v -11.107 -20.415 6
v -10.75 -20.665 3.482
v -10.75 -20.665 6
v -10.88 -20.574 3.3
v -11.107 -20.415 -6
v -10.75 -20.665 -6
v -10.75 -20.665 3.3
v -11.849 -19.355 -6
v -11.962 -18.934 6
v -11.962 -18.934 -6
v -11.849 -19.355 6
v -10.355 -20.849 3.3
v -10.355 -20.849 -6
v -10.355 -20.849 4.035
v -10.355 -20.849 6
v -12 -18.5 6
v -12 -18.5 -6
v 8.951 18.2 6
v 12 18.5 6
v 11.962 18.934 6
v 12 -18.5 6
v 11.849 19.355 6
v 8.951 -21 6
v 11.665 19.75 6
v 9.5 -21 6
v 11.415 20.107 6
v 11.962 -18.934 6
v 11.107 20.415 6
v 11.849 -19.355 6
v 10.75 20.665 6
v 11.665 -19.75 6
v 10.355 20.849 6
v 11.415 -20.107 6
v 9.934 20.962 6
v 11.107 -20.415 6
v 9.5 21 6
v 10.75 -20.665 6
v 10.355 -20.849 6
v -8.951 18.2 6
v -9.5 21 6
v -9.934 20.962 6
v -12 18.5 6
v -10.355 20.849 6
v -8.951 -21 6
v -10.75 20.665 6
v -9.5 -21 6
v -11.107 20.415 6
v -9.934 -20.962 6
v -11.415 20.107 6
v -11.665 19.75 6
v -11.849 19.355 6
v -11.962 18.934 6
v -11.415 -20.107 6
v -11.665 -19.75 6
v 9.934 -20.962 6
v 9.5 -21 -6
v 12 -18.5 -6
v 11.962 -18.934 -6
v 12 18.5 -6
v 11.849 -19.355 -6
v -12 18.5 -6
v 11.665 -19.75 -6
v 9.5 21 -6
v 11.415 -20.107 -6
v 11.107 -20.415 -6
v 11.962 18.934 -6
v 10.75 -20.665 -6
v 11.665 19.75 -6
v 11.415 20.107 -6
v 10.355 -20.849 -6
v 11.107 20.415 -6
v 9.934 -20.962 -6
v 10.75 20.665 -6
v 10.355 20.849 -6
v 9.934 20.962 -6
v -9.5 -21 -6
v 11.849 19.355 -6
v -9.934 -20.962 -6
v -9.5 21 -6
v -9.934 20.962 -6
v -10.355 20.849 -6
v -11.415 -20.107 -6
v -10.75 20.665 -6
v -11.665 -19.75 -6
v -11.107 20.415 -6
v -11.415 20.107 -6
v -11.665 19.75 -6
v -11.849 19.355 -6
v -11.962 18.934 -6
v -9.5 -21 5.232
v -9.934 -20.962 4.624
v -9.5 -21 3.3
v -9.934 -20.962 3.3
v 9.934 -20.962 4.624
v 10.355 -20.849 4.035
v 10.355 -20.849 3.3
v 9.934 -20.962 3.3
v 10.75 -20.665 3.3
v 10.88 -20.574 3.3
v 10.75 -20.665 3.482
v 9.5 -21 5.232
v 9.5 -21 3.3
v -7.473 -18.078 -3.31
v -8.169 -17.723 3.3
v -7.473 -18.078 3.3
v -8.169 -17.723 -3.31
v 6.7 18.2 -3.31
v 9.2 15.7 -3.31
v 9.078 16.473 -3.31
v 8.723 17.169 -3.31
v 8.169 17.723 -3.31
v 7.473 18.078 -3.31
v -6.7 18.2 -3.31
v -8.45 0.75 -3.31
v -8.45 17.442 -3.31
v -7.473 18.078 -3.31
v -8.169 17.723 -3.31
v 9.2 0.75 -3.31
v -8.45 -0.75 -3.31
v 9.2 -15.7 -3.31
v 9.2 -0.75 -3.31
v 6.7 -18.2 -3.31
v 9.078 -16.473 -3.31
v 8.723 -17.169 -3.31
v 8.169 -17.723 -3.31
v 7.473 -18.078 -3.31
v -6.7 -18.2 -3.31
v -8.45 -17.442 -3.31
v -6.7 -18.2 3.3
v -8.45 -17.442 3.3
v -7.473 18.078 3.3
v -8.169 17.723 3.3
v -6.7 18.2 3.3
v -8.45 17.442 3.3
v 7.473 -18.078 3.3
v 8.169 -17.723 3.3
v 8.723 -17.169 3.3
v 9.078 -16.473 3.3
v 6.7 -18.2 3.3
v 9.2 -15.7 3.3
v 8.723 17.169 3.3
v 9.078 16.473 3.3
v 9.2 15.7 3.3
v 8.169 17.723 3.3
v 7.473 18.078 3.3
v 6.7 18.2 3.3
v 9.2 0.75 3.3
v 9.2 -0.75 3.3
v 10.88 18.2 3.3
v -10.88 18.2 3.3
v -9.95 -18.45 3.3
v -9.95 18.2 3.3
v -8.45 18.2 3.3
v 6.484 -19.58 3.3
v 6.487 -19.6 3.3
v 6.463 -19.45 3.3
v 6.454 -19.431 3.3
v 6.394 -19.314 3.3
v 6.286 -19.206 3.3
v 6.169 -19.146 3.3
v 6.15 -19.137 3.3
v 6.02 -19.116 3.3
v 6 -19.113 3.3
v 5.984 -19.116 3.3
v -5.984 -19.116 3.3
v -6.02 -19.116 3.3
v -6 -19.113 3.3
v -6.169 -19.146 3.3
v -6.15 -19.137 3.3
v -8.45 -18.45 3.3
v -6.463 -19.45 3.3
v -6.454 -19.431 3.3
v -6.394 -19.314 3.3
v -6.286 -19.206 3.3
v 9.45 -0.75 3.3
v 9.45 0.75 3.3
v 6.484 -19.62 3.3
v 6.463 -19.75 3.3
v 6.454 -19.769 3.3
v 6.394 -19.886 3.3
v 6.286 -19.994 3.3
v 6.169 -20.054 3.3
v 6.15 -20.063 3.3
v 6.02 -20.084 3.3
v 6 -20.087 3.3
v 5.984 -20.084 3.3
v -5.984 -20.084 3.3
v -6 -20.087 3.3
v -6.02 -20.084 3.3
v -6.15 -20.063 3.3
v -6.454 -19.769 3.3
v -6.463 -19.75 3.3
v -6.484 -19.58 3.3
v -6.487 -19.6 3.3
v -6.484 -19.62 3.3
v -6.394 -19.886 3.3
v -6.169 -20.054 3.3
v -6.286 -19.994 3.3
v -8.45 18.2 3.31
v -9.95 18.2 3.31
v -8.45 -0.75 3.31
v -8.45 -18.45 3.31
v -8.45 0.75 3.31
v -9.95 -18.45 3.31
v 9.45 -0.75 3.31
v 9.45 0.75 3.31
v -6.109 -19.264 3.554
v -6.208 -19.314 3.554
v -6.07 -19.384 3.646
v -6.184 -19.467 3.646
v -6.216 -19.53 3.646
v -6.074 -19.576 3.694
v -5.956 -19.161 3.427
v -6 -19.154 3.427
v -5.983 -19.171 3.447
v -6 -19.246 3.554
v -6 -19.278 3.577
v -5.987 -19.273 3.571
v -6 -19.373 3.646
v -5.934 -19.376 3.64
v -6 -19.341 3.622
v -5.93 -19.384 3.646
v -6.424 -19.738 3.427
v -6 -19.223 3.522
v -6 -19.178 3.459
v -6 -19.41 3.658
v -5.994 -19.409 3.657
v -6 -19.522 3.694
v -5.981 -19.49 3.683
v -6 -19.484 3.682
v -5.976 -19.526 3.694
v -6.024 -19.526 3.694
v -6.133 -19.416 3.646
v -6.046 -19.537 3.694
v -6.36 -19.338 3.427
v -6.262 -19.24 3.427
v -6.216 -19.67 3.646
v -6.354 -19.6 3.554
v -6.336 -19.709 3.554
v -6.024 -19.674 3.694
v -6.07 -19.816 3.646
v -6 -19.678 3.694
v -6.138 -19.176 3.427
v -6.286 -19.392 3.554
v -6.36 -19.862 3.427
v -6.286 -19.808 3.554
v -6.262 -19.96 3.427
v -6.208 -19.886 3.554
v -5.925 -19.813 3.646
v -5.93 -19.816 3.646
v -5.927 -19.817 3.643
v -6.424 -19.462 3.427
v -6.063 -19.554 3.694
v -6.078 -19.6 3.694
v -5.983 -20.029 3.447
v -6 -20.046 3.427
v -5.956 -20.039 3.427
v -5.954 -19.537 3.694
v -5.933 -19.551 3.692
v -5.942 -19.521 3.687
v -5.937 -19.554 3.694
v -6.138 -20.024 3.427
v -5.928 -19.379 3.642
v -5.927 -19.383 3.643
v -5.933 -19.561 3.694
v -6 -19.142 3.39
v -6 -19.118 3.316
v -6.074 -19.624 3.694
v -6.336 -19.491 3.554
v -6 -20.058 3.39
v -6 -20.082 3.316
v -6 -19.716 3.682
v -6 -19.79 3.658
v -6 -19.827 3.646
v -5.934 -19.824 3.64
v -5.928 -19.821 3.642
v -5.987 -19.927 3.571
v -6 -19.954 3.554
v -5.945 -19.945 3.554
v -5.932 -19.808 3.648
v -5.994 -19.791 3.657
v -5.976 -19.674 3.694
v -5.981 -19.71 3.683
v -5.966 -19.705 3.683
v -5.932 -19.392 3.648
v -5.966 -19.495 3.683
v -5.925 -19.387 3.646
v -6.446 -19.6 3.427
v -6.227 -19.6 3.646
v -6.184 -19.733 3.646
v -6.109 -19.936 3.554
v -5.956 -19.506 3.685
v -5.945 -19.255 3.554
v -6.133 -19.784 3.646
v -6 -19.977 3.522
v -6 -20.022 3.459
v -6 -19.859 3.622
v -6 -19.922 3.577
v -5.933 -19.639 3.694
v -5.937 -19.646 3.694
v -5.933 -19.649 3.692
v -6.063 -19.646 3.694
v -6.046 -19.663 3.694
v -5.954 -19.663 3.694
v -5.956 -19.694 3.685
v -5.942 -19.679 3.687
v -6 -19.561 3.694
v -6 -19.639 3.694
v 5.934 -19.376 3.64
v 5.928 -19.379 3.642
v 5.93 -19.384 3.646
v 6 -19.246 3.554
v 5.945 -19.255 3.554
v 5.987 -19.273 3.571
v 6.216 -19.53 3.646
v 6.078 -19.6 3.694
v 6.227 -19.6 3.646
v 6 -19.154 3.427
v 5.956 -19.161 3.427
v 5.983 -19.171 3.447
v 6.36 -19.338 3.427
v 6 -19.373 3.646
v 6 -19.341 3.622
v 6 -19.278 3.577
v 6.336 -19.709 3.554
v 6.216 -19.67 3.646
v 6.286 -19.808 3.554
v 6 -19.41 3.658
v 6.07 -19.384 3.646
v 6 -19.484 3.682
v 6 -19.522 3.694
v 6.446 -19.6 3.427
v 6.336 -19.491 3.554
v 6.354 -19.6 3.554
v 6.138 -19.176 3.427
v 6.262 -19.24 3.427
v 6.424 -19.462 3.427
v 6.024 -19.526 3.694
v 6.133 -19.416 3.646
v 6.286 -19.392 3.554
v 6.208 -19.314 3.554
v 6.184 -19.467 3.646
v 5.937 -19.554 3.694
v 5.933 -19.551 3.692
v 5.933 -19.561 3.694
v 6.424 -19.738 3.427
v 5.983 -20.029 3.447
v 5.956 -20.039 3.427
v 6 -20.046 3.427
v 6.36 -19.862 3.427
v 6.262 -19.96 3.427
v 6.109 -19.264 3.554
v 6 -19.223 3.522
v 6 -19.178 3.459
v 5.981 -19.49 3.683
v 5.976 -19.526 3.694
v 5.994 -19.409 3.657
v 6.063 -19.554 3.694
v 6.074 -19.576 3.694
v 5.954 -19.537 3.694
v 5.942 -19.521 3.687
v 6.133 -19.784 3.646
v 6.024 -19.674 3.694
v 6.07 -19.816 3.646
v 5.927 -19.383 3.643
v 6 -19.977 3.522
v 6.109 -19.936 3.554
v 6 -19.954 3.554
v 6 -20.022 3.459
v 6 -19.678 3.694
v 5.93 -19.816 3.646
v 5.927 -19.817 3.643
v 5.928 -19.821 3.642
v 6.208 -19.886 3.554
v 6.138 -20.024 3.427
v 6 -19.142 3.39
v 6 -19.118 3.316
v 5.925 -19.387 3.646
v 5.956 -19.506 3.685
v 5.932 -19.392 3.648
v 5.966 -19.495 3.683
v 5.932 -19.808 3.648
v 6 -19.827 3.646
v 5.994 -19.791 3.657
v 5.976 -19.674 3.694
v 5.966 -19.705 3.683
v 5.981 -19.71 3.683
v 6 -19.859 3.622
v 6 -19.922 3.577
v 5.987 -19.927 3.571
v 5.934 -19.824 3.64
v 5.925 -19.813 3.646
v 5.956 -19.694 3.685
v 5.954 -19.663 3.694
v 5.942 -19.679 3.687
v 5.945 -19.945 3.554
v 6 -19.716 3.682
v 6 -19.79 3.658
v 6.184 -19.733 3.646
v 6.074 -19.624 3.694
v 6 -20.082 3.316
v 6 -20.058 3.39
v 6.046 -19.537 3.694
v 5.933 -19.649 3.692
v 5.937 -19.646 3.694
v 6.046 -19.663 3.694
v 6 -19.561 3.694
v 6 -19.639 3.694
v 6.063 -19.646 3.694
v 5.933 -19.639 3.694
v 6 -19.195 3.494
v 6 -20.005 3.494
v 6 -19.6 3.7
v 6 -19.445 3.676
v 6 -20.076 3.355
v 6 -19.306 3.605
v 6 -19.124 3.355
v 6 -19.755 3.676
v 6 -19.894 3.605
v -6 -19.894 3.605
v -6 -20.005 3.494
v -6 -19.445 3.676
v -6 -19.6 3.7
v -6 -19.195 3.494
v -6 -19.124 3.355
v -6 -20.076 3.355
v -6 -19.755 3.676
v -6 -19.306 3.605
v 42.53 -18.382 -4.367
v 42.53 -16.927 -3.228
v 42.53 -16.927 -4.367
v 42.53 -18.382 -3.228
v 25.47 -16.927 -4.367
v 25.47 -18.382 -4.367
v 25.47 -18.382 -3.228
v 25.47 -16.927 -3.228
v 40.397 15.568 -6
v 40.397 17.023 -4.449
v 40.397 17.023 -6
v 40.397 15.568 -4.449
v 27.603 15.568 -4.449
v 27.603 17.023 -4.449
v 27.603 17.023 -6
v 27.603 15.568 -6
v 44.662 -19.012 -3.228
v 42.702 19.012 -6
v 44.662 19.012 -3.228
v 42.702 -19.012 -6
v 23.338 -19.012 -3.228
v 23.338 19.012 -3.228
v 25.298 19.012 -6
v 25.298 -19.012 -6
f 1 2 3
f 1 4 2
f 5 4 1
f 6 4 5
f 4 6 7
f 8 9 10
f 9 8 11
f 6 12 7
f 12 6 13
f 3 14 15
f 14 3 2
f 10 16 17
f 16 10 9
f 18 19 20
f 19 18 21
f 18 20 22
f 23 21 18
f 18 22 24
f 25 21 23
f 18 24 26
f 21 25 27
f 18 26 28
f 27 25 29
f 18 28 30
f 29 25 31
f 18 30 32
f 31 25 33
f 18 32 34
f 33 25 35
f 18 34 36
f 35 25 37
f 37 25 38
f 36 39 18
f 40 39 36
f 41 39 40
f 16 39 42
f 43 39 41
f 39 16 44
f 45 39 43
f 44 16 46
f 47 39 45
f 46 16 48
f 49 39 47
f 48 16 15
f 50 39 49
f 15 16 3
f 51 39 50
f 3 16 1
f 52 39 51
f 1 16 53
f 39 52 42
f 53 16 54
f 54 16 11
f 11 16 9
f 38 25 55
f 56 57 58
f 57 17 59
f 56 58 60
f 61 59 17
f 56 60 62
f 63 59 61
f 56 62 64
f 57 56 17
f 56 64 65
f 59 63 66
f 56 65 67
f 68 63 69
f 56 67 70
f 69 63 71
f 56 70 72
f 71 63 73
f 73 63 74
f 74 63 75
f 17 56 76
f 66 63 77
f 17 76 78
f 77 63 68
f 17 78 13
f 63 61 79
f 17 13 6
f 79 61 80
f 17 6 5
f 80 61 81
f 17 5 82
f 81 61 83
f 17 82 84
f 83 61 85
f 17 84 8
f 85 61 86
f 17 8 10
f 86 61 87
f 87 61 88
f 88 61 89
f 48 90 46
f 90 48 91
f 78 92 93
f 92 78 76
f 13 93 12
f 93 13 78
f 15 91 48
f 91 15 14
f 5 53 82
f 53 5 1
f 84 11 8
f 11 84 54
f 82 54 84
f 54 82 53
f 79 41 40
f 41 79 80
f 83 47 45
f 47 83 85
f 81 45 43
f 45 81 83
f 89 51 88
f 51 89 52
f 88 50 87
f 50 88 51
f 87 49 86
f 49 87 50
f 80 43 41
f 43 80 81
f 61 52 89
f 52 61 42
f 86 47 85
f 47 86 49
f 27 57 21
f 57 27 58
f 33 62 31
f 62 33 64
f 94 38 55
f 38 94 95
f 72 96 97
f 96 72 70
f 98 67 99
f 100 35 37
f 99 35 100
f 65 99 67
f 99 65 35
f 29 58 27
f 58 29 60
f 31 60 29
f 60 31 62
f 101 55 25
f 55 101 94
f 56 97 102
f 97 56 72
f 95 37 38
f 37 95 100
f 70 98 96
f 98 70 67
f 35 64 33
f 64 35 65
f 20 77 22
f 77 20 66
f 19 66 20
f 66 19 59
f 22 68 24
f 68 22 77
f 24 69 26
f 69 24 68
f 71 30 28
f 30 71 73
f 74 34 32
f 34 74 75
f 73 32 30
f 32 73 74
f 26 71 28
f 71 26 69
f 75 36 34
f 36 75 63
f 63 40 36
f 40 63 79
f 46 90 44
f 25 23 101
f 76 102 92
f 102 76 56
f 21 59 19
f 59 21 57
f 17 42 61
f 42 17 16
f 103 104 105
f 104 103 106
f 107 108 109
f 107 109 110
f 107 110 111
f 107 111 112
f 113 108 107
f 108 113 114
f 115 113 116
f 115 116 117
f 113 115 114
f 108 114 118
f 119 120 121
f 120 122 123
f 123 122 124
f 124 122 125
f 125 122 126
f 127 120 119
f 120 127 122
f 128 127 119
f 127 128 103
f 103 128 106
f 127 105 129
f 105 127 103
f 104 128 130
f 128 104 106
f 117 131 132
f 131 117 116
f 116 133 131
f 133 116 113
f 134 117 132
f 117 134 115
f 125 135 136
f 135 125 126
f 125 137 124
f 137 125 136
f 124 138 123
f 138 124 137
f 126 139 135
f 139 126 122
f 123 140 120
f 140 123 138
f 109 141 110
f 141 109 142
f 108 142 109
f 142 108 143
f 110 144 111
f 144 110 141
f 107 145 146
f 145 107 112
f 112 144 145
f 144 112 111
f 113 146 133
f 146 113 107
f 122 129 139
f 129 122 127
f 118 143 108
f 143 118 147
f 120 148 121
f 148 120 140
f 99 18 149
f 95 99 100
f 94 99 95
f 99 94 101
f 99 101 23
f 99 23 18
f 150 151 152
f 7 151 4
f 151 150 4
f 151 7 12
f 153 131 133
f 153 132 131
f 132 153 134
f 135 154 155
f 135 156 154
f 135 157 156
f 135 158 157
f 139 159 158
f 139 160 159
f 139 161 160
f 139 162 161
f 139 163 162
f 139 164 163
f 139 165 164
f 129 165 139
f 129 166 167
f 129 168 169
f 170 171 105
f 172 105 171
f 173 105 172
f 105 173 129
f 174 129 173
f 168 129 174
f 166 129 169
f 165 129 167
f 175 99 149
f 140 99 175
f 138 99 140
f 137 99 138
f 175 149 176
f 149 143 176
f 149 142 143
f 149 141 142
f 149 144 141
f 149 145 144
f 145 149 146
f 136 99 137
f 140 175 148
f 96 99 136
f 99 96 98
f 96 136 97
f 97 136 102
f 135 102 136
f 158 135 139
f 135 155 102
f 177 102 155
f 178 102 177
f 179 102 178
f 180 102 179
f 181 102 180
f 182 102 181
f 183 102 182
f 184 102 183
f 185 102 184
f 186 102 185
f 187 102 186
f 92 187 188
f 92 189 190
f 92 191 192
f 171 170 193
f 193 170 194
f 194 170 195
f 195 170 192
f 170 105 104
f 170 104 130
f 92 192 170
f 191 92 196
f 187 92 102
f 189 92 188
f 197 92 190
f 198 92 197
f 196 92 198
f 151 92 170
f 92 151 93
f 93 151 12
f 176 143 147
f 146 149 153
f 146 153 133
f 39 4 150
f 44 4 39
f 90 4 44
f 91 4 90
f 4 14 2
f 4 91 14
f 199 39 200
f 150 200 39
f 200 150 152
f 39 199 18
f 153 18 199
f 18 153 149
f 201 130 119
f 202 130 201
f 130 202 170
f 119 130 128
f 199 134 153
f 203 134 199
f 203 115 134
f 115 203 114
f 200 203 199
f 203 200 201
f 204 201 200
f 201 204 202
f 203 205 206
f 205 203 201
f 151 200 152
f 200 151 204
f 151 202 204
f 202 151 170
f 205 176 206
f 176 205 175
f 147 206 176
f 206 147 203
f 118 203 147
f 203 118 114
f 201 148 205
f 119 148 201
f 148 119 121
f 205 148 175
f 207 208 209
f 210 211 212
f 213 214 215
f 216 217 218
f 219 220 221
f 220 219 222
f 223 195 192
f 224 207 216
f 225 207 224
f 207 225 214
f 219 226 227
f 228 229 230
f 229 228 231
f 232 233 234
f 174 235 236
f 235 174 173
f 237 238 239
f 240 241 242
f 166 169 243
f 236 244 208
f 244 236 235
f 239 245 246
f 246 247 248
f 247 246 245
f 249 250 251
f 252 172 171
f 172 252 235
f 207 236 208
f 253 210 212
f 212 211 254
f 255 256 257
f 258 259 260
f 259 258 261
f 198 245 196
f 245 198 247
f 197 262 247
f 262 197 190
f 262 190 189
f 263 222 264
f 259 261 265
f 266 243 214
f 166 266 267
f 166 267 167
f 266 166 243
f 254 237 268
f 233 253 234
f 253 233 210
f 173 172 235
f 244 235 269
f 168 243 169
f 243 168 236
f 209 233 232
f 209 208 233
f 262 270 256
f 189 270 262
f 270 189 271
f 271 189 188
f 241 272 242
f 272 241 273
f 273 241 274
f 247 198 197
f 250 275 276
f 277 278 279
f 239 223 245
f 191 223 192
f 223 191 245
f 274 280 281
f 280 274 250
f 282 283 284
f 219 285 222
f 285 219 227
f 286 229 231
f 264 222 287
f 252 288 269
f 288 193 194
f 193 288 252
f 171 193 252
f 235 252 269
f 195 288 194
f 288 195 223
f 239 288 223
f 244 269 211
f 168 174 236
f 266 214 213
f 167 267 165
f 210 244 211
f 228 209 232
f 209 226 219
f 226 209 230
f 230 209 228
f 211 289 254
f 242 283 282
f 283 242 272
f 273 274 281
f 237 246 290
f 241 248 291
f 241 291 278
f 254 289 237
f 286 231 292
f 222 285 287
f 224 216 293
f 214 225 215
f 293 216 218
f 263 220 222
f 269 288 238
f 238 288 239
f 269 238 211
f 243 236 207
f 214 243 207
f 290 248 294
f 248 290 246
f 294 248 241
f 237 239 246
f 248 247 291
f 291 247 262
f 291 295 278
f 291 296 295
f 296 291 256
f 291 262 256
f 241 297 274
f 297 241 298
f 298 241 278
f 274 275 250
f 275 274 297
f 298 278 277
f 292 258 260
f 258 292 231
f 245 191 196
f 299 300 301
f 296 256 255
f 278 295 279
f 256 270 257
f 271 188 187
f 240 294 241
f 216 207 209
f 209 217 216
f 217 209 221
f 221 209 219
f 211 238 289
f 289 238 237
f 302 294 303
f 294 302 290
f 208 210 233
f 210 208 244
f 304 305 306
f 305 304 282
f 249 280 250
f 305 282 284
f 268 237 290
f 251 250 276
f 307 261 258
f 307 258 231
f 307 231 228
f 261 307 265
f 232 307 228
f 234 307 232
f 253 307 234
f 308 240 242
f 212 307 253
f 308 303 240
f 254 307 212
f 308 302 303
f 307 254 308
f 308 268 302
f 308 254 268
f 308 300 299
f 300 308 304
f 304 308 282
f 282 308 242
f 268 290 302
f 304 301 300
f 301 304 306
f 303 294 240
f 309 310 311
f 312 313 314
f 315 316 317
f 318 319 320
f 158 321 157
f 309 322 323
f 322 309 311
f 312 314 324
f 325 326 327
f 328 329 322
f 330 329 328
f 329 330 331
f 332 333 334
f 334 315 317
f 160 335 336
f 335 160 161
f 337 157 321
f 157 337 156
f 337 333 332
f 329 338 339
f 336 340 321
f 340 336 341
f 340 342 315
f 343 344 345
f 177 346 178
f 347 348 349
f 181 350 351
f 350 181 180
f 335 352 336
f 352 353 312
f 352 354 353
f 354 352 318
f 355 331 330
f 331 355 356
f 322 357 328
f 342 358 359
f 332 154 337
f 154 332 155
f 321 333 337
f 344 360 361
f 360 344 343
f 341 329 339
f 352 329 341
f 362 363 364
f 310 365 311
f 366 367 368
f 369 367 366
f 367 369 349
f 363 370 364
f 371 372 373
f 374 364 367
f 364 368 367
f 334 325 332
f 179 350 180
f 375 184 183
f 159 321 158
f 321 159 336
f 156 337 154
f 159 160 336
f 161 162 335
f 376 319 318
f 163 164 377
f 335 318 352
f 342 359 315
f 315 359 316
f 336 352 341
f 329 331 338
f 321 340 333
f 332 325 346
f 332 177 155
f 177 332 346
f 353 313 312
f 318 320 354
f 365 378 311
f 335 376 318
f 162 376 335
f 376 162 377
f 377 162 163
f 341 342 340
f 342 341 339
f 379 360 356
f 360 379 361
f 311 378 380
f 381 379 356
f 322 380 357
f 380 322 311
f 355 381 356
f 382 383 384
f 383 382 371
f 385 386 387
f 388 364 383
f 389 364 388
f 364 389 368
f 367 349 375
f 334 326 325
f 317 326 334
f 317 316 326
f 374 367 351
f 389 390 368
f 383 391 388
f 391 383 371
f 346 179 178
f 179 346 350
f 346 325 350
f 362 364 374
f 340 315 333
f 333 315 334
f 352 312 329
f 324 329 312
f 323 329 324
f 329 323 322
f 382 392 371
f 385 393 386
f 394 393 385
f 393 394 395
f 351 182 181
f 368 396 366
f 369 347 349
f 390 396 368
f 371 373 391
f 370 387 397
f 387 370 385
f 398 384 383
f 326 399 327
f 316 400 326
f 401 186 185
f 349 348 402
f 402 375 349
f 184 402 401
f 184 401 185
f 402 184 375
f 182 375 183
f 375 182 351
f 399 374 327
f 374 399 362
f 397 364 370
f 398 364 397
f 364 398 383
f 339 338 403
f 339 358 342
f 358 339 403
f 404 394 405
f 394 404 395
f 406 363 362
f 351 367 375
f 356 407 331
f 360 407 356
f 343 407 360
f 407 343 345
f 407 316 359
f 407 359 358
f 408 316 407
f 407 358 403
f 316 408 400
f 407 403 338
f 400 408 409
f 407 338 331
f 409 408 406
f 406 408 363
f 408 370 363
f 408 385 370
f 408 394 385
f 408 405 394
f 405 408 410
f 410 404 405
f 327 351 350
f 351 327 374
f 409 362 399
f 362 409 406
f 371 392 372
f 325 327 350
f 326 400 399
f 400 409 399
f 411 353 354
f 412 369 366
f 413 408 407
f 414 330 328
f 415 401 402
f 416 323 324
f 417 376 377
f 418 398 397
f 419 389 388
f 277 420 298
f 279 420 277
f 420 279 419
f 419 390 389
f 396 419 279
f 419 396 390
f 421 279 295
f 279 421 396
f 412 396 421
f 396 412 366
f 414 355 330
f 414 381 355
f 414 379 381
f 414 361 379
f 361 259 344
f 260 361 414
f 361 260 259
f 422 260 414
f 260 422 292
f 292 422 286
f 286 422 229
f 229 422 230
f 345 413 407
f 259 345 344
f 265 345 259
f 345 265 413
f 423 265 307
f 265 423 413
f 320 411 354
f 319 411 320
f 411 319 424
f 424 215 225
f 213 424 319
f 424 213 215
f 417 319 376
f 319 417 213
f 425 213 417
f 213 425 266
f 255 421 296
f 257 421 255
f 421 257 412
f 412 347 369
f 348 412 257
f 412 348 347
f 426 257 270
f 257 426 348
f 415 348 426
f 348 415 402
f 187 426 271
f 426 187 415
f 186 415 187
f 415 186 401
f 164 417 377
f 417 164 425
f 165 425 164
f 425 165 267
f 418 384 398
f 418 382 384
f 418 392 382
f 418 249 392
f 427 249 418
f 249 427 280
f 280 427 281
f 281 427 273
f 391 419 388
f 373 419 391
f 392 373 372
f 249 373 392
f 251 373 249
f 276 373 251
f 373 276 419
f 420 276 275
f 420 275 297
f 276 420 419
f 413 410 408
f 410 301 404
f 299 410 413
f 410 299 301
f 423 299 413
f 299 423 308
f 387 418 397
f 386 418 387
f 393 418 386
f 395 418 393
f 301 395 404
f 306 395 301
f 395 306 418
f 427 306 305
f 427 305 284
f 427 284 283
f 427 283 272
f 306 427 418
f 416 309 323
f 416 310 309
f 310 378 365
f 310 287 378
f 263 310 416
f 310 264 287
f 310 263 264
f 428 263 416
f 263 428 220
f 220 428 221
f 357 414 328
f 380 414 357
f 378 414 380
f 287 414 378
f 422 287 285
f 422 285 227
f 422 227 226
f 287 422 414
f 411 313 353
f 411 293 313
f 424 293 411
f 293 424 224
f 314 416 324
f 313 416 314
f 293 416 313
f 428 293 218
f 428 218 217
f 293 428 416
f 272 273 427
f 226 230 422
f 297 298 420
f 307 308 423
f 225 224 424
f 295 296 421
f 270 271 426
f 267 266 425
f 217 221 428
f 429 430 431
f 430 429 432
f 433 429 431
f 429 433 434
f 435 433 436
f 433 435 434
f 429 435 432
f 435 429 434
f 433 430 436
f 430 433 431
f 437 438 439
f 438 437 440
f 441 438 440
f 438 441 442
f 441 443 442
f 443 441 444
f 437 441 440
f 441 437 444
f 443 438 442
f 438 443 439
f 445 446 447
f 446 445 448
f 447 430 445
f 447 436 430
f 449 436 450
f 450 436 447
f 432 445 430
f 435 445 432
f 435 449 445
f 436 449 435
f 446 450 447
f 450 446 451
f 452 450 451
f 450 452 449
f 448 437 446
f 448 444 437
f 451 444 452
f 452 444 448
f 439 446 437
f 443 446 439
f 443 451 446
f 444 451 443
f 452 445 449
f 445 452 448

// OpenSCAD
// [FL_INDEX: keywords="openscad, 3d_parametric, Box_with_Sliding_Top, csg_solid" | COT="Parametric OpenSCAD design from 3DCodeverse"]
// Title: Box with Sliding Top

include <MCAD/boxes.scad>

//Pill box with sliding lid

/* [Outside Box Dimensions] */
//Box Width (min: 5 x Wall Thickness)
bX=24; 
//Box Depth (min: 5 x Wall Thickness)
bY=42; 
//Box Height (min: 5 x Wall Thickness)
bZ=12;
//Corner Radius (radius of the corner fillet inside and outside)
corner=2.5; 
//X Dividers (0 for no dividers)
col=0; 
//Y Dividers (0 for no dividers)
row=2; 
//Divider Wall Thickness
divWall=1.5;

/* [Wall Thickness] */
//Wall Thickness (min: 2mm)
wall=2.8;

/* [Lid] */
//Lid Lip Width (min: 1mm)
lip=2;
//Snugness of Lid (values approaching 1.0 result in a snugger fit)
snug=.99; 

/* [Catch] */
//Catch Height (height over the lip for the catch)
catch=1;

/* [Hidden] */
boxDim=[bX, bY, bZ]; 
over=.5; //amount to extend parts that need to have interference (such as dividers)
module xDiv(inSide){
  xInc=inSide[0]/col;
  for ( i = [1 : col-1] ) {
    translate([i*xInc, 0, 0])cube([divWall, inSide[1]+over, inSide[2]+over], center=true);
  }
}


module yDiv(inSide){
  yInc=inSide[1]/row;
  for (i = [1 : row-1] ) {
    translate([0, i*yInc, 0])cube([inSide[0]+over, divWall, inSide[2]+over], center=true);
  }
}

module drawBox () {
  innerBox=[bX-(2*wall), bY-(2*wall), bZ-(2*wall)+.22];
  echo("innerBox=", innerBox);
  union() {
    difference() {
      roundedBox(boxDim, corner, sidesonly=1, $fn=36);
      roundedBox(innerBox, corner, sidesonly=1, $fn=20);
      translate([0, -wall, bZ/2+.1]) cutLid(0);
    }
    translate([-innerBox[0]/2, 0, -over/2]) xDiv(innerBox);
    translate([0, -innerBox[1]/2, -over/2]) yDiv(innerBox);
  }
}

module cutLid(shorten, catch) {
  //Create a trapezoid lid 

  insideLip=wall*1.2; //lip inside the box for the lid to rest upon
  lX=bX-(2*wall)+insideLip;
  lY=bY-shorten;

  echo("inside lip=", insideLip/2);

  //polygon points
  p0=[0, 0];
  p1=[lX, 0];
  p2=[lX-lip, wall];
  p3=[lip, wall];

  // this needs to be less than 45 deg to be usable
  echo("Lip Overhang (degrees)=", atan(lip/wall));
  
  difference() {
    rotate([90,0,0])
      translate([-lX/2, -wall, 0]) 
      linear_extrude(height=lY, center=true) polygon([p0, p1, p2, p3], paths=[[0,1,2,3]]);
    if (catch==1) {
      translate([0, lY/2-wall/2, -wall+catch/2]) cube([lX*.8, catch*1.5, catch*1.3], center=true);
      //Add an additional slot to make it easier to slide open the lid
      translate([0, -lY/2+wall, wall/3]) cube([lX*.6, catch*1.5, catch*5], center=true);
    } else {
      echo("catch=false");
    }

  }
}

module drawCatch() {
  rad=catch/2;
  lX=bX-2*(wall+.2);

  union() {
    translate([-lX/3, 0, 0]) sphere(r=rad, $fn=20);
    translate([ lX/3, 0, 0]) sphere(r=rad, $fn=20);
    rotate([0,90,0])cylinder(h=lX/1.5, r=rad, center=true, $fn=20);
  }
}

module assemble() {
    union() {
      drawBox();
      //move the catch to the front of the box
      translate([0, -(bY/2)+wall/2, bZ/2-wall]) drawCatch();
    }
  //draw the lid (wall, 1) - second paramater specifies to add a hole for a catch
  translate([bX+10, 0, (-bZ/2)]) rotate([180, 0, 0]) scale([snug-.01, snug-.02, snug]) cutLid(wall, 1);
}

assemble();
